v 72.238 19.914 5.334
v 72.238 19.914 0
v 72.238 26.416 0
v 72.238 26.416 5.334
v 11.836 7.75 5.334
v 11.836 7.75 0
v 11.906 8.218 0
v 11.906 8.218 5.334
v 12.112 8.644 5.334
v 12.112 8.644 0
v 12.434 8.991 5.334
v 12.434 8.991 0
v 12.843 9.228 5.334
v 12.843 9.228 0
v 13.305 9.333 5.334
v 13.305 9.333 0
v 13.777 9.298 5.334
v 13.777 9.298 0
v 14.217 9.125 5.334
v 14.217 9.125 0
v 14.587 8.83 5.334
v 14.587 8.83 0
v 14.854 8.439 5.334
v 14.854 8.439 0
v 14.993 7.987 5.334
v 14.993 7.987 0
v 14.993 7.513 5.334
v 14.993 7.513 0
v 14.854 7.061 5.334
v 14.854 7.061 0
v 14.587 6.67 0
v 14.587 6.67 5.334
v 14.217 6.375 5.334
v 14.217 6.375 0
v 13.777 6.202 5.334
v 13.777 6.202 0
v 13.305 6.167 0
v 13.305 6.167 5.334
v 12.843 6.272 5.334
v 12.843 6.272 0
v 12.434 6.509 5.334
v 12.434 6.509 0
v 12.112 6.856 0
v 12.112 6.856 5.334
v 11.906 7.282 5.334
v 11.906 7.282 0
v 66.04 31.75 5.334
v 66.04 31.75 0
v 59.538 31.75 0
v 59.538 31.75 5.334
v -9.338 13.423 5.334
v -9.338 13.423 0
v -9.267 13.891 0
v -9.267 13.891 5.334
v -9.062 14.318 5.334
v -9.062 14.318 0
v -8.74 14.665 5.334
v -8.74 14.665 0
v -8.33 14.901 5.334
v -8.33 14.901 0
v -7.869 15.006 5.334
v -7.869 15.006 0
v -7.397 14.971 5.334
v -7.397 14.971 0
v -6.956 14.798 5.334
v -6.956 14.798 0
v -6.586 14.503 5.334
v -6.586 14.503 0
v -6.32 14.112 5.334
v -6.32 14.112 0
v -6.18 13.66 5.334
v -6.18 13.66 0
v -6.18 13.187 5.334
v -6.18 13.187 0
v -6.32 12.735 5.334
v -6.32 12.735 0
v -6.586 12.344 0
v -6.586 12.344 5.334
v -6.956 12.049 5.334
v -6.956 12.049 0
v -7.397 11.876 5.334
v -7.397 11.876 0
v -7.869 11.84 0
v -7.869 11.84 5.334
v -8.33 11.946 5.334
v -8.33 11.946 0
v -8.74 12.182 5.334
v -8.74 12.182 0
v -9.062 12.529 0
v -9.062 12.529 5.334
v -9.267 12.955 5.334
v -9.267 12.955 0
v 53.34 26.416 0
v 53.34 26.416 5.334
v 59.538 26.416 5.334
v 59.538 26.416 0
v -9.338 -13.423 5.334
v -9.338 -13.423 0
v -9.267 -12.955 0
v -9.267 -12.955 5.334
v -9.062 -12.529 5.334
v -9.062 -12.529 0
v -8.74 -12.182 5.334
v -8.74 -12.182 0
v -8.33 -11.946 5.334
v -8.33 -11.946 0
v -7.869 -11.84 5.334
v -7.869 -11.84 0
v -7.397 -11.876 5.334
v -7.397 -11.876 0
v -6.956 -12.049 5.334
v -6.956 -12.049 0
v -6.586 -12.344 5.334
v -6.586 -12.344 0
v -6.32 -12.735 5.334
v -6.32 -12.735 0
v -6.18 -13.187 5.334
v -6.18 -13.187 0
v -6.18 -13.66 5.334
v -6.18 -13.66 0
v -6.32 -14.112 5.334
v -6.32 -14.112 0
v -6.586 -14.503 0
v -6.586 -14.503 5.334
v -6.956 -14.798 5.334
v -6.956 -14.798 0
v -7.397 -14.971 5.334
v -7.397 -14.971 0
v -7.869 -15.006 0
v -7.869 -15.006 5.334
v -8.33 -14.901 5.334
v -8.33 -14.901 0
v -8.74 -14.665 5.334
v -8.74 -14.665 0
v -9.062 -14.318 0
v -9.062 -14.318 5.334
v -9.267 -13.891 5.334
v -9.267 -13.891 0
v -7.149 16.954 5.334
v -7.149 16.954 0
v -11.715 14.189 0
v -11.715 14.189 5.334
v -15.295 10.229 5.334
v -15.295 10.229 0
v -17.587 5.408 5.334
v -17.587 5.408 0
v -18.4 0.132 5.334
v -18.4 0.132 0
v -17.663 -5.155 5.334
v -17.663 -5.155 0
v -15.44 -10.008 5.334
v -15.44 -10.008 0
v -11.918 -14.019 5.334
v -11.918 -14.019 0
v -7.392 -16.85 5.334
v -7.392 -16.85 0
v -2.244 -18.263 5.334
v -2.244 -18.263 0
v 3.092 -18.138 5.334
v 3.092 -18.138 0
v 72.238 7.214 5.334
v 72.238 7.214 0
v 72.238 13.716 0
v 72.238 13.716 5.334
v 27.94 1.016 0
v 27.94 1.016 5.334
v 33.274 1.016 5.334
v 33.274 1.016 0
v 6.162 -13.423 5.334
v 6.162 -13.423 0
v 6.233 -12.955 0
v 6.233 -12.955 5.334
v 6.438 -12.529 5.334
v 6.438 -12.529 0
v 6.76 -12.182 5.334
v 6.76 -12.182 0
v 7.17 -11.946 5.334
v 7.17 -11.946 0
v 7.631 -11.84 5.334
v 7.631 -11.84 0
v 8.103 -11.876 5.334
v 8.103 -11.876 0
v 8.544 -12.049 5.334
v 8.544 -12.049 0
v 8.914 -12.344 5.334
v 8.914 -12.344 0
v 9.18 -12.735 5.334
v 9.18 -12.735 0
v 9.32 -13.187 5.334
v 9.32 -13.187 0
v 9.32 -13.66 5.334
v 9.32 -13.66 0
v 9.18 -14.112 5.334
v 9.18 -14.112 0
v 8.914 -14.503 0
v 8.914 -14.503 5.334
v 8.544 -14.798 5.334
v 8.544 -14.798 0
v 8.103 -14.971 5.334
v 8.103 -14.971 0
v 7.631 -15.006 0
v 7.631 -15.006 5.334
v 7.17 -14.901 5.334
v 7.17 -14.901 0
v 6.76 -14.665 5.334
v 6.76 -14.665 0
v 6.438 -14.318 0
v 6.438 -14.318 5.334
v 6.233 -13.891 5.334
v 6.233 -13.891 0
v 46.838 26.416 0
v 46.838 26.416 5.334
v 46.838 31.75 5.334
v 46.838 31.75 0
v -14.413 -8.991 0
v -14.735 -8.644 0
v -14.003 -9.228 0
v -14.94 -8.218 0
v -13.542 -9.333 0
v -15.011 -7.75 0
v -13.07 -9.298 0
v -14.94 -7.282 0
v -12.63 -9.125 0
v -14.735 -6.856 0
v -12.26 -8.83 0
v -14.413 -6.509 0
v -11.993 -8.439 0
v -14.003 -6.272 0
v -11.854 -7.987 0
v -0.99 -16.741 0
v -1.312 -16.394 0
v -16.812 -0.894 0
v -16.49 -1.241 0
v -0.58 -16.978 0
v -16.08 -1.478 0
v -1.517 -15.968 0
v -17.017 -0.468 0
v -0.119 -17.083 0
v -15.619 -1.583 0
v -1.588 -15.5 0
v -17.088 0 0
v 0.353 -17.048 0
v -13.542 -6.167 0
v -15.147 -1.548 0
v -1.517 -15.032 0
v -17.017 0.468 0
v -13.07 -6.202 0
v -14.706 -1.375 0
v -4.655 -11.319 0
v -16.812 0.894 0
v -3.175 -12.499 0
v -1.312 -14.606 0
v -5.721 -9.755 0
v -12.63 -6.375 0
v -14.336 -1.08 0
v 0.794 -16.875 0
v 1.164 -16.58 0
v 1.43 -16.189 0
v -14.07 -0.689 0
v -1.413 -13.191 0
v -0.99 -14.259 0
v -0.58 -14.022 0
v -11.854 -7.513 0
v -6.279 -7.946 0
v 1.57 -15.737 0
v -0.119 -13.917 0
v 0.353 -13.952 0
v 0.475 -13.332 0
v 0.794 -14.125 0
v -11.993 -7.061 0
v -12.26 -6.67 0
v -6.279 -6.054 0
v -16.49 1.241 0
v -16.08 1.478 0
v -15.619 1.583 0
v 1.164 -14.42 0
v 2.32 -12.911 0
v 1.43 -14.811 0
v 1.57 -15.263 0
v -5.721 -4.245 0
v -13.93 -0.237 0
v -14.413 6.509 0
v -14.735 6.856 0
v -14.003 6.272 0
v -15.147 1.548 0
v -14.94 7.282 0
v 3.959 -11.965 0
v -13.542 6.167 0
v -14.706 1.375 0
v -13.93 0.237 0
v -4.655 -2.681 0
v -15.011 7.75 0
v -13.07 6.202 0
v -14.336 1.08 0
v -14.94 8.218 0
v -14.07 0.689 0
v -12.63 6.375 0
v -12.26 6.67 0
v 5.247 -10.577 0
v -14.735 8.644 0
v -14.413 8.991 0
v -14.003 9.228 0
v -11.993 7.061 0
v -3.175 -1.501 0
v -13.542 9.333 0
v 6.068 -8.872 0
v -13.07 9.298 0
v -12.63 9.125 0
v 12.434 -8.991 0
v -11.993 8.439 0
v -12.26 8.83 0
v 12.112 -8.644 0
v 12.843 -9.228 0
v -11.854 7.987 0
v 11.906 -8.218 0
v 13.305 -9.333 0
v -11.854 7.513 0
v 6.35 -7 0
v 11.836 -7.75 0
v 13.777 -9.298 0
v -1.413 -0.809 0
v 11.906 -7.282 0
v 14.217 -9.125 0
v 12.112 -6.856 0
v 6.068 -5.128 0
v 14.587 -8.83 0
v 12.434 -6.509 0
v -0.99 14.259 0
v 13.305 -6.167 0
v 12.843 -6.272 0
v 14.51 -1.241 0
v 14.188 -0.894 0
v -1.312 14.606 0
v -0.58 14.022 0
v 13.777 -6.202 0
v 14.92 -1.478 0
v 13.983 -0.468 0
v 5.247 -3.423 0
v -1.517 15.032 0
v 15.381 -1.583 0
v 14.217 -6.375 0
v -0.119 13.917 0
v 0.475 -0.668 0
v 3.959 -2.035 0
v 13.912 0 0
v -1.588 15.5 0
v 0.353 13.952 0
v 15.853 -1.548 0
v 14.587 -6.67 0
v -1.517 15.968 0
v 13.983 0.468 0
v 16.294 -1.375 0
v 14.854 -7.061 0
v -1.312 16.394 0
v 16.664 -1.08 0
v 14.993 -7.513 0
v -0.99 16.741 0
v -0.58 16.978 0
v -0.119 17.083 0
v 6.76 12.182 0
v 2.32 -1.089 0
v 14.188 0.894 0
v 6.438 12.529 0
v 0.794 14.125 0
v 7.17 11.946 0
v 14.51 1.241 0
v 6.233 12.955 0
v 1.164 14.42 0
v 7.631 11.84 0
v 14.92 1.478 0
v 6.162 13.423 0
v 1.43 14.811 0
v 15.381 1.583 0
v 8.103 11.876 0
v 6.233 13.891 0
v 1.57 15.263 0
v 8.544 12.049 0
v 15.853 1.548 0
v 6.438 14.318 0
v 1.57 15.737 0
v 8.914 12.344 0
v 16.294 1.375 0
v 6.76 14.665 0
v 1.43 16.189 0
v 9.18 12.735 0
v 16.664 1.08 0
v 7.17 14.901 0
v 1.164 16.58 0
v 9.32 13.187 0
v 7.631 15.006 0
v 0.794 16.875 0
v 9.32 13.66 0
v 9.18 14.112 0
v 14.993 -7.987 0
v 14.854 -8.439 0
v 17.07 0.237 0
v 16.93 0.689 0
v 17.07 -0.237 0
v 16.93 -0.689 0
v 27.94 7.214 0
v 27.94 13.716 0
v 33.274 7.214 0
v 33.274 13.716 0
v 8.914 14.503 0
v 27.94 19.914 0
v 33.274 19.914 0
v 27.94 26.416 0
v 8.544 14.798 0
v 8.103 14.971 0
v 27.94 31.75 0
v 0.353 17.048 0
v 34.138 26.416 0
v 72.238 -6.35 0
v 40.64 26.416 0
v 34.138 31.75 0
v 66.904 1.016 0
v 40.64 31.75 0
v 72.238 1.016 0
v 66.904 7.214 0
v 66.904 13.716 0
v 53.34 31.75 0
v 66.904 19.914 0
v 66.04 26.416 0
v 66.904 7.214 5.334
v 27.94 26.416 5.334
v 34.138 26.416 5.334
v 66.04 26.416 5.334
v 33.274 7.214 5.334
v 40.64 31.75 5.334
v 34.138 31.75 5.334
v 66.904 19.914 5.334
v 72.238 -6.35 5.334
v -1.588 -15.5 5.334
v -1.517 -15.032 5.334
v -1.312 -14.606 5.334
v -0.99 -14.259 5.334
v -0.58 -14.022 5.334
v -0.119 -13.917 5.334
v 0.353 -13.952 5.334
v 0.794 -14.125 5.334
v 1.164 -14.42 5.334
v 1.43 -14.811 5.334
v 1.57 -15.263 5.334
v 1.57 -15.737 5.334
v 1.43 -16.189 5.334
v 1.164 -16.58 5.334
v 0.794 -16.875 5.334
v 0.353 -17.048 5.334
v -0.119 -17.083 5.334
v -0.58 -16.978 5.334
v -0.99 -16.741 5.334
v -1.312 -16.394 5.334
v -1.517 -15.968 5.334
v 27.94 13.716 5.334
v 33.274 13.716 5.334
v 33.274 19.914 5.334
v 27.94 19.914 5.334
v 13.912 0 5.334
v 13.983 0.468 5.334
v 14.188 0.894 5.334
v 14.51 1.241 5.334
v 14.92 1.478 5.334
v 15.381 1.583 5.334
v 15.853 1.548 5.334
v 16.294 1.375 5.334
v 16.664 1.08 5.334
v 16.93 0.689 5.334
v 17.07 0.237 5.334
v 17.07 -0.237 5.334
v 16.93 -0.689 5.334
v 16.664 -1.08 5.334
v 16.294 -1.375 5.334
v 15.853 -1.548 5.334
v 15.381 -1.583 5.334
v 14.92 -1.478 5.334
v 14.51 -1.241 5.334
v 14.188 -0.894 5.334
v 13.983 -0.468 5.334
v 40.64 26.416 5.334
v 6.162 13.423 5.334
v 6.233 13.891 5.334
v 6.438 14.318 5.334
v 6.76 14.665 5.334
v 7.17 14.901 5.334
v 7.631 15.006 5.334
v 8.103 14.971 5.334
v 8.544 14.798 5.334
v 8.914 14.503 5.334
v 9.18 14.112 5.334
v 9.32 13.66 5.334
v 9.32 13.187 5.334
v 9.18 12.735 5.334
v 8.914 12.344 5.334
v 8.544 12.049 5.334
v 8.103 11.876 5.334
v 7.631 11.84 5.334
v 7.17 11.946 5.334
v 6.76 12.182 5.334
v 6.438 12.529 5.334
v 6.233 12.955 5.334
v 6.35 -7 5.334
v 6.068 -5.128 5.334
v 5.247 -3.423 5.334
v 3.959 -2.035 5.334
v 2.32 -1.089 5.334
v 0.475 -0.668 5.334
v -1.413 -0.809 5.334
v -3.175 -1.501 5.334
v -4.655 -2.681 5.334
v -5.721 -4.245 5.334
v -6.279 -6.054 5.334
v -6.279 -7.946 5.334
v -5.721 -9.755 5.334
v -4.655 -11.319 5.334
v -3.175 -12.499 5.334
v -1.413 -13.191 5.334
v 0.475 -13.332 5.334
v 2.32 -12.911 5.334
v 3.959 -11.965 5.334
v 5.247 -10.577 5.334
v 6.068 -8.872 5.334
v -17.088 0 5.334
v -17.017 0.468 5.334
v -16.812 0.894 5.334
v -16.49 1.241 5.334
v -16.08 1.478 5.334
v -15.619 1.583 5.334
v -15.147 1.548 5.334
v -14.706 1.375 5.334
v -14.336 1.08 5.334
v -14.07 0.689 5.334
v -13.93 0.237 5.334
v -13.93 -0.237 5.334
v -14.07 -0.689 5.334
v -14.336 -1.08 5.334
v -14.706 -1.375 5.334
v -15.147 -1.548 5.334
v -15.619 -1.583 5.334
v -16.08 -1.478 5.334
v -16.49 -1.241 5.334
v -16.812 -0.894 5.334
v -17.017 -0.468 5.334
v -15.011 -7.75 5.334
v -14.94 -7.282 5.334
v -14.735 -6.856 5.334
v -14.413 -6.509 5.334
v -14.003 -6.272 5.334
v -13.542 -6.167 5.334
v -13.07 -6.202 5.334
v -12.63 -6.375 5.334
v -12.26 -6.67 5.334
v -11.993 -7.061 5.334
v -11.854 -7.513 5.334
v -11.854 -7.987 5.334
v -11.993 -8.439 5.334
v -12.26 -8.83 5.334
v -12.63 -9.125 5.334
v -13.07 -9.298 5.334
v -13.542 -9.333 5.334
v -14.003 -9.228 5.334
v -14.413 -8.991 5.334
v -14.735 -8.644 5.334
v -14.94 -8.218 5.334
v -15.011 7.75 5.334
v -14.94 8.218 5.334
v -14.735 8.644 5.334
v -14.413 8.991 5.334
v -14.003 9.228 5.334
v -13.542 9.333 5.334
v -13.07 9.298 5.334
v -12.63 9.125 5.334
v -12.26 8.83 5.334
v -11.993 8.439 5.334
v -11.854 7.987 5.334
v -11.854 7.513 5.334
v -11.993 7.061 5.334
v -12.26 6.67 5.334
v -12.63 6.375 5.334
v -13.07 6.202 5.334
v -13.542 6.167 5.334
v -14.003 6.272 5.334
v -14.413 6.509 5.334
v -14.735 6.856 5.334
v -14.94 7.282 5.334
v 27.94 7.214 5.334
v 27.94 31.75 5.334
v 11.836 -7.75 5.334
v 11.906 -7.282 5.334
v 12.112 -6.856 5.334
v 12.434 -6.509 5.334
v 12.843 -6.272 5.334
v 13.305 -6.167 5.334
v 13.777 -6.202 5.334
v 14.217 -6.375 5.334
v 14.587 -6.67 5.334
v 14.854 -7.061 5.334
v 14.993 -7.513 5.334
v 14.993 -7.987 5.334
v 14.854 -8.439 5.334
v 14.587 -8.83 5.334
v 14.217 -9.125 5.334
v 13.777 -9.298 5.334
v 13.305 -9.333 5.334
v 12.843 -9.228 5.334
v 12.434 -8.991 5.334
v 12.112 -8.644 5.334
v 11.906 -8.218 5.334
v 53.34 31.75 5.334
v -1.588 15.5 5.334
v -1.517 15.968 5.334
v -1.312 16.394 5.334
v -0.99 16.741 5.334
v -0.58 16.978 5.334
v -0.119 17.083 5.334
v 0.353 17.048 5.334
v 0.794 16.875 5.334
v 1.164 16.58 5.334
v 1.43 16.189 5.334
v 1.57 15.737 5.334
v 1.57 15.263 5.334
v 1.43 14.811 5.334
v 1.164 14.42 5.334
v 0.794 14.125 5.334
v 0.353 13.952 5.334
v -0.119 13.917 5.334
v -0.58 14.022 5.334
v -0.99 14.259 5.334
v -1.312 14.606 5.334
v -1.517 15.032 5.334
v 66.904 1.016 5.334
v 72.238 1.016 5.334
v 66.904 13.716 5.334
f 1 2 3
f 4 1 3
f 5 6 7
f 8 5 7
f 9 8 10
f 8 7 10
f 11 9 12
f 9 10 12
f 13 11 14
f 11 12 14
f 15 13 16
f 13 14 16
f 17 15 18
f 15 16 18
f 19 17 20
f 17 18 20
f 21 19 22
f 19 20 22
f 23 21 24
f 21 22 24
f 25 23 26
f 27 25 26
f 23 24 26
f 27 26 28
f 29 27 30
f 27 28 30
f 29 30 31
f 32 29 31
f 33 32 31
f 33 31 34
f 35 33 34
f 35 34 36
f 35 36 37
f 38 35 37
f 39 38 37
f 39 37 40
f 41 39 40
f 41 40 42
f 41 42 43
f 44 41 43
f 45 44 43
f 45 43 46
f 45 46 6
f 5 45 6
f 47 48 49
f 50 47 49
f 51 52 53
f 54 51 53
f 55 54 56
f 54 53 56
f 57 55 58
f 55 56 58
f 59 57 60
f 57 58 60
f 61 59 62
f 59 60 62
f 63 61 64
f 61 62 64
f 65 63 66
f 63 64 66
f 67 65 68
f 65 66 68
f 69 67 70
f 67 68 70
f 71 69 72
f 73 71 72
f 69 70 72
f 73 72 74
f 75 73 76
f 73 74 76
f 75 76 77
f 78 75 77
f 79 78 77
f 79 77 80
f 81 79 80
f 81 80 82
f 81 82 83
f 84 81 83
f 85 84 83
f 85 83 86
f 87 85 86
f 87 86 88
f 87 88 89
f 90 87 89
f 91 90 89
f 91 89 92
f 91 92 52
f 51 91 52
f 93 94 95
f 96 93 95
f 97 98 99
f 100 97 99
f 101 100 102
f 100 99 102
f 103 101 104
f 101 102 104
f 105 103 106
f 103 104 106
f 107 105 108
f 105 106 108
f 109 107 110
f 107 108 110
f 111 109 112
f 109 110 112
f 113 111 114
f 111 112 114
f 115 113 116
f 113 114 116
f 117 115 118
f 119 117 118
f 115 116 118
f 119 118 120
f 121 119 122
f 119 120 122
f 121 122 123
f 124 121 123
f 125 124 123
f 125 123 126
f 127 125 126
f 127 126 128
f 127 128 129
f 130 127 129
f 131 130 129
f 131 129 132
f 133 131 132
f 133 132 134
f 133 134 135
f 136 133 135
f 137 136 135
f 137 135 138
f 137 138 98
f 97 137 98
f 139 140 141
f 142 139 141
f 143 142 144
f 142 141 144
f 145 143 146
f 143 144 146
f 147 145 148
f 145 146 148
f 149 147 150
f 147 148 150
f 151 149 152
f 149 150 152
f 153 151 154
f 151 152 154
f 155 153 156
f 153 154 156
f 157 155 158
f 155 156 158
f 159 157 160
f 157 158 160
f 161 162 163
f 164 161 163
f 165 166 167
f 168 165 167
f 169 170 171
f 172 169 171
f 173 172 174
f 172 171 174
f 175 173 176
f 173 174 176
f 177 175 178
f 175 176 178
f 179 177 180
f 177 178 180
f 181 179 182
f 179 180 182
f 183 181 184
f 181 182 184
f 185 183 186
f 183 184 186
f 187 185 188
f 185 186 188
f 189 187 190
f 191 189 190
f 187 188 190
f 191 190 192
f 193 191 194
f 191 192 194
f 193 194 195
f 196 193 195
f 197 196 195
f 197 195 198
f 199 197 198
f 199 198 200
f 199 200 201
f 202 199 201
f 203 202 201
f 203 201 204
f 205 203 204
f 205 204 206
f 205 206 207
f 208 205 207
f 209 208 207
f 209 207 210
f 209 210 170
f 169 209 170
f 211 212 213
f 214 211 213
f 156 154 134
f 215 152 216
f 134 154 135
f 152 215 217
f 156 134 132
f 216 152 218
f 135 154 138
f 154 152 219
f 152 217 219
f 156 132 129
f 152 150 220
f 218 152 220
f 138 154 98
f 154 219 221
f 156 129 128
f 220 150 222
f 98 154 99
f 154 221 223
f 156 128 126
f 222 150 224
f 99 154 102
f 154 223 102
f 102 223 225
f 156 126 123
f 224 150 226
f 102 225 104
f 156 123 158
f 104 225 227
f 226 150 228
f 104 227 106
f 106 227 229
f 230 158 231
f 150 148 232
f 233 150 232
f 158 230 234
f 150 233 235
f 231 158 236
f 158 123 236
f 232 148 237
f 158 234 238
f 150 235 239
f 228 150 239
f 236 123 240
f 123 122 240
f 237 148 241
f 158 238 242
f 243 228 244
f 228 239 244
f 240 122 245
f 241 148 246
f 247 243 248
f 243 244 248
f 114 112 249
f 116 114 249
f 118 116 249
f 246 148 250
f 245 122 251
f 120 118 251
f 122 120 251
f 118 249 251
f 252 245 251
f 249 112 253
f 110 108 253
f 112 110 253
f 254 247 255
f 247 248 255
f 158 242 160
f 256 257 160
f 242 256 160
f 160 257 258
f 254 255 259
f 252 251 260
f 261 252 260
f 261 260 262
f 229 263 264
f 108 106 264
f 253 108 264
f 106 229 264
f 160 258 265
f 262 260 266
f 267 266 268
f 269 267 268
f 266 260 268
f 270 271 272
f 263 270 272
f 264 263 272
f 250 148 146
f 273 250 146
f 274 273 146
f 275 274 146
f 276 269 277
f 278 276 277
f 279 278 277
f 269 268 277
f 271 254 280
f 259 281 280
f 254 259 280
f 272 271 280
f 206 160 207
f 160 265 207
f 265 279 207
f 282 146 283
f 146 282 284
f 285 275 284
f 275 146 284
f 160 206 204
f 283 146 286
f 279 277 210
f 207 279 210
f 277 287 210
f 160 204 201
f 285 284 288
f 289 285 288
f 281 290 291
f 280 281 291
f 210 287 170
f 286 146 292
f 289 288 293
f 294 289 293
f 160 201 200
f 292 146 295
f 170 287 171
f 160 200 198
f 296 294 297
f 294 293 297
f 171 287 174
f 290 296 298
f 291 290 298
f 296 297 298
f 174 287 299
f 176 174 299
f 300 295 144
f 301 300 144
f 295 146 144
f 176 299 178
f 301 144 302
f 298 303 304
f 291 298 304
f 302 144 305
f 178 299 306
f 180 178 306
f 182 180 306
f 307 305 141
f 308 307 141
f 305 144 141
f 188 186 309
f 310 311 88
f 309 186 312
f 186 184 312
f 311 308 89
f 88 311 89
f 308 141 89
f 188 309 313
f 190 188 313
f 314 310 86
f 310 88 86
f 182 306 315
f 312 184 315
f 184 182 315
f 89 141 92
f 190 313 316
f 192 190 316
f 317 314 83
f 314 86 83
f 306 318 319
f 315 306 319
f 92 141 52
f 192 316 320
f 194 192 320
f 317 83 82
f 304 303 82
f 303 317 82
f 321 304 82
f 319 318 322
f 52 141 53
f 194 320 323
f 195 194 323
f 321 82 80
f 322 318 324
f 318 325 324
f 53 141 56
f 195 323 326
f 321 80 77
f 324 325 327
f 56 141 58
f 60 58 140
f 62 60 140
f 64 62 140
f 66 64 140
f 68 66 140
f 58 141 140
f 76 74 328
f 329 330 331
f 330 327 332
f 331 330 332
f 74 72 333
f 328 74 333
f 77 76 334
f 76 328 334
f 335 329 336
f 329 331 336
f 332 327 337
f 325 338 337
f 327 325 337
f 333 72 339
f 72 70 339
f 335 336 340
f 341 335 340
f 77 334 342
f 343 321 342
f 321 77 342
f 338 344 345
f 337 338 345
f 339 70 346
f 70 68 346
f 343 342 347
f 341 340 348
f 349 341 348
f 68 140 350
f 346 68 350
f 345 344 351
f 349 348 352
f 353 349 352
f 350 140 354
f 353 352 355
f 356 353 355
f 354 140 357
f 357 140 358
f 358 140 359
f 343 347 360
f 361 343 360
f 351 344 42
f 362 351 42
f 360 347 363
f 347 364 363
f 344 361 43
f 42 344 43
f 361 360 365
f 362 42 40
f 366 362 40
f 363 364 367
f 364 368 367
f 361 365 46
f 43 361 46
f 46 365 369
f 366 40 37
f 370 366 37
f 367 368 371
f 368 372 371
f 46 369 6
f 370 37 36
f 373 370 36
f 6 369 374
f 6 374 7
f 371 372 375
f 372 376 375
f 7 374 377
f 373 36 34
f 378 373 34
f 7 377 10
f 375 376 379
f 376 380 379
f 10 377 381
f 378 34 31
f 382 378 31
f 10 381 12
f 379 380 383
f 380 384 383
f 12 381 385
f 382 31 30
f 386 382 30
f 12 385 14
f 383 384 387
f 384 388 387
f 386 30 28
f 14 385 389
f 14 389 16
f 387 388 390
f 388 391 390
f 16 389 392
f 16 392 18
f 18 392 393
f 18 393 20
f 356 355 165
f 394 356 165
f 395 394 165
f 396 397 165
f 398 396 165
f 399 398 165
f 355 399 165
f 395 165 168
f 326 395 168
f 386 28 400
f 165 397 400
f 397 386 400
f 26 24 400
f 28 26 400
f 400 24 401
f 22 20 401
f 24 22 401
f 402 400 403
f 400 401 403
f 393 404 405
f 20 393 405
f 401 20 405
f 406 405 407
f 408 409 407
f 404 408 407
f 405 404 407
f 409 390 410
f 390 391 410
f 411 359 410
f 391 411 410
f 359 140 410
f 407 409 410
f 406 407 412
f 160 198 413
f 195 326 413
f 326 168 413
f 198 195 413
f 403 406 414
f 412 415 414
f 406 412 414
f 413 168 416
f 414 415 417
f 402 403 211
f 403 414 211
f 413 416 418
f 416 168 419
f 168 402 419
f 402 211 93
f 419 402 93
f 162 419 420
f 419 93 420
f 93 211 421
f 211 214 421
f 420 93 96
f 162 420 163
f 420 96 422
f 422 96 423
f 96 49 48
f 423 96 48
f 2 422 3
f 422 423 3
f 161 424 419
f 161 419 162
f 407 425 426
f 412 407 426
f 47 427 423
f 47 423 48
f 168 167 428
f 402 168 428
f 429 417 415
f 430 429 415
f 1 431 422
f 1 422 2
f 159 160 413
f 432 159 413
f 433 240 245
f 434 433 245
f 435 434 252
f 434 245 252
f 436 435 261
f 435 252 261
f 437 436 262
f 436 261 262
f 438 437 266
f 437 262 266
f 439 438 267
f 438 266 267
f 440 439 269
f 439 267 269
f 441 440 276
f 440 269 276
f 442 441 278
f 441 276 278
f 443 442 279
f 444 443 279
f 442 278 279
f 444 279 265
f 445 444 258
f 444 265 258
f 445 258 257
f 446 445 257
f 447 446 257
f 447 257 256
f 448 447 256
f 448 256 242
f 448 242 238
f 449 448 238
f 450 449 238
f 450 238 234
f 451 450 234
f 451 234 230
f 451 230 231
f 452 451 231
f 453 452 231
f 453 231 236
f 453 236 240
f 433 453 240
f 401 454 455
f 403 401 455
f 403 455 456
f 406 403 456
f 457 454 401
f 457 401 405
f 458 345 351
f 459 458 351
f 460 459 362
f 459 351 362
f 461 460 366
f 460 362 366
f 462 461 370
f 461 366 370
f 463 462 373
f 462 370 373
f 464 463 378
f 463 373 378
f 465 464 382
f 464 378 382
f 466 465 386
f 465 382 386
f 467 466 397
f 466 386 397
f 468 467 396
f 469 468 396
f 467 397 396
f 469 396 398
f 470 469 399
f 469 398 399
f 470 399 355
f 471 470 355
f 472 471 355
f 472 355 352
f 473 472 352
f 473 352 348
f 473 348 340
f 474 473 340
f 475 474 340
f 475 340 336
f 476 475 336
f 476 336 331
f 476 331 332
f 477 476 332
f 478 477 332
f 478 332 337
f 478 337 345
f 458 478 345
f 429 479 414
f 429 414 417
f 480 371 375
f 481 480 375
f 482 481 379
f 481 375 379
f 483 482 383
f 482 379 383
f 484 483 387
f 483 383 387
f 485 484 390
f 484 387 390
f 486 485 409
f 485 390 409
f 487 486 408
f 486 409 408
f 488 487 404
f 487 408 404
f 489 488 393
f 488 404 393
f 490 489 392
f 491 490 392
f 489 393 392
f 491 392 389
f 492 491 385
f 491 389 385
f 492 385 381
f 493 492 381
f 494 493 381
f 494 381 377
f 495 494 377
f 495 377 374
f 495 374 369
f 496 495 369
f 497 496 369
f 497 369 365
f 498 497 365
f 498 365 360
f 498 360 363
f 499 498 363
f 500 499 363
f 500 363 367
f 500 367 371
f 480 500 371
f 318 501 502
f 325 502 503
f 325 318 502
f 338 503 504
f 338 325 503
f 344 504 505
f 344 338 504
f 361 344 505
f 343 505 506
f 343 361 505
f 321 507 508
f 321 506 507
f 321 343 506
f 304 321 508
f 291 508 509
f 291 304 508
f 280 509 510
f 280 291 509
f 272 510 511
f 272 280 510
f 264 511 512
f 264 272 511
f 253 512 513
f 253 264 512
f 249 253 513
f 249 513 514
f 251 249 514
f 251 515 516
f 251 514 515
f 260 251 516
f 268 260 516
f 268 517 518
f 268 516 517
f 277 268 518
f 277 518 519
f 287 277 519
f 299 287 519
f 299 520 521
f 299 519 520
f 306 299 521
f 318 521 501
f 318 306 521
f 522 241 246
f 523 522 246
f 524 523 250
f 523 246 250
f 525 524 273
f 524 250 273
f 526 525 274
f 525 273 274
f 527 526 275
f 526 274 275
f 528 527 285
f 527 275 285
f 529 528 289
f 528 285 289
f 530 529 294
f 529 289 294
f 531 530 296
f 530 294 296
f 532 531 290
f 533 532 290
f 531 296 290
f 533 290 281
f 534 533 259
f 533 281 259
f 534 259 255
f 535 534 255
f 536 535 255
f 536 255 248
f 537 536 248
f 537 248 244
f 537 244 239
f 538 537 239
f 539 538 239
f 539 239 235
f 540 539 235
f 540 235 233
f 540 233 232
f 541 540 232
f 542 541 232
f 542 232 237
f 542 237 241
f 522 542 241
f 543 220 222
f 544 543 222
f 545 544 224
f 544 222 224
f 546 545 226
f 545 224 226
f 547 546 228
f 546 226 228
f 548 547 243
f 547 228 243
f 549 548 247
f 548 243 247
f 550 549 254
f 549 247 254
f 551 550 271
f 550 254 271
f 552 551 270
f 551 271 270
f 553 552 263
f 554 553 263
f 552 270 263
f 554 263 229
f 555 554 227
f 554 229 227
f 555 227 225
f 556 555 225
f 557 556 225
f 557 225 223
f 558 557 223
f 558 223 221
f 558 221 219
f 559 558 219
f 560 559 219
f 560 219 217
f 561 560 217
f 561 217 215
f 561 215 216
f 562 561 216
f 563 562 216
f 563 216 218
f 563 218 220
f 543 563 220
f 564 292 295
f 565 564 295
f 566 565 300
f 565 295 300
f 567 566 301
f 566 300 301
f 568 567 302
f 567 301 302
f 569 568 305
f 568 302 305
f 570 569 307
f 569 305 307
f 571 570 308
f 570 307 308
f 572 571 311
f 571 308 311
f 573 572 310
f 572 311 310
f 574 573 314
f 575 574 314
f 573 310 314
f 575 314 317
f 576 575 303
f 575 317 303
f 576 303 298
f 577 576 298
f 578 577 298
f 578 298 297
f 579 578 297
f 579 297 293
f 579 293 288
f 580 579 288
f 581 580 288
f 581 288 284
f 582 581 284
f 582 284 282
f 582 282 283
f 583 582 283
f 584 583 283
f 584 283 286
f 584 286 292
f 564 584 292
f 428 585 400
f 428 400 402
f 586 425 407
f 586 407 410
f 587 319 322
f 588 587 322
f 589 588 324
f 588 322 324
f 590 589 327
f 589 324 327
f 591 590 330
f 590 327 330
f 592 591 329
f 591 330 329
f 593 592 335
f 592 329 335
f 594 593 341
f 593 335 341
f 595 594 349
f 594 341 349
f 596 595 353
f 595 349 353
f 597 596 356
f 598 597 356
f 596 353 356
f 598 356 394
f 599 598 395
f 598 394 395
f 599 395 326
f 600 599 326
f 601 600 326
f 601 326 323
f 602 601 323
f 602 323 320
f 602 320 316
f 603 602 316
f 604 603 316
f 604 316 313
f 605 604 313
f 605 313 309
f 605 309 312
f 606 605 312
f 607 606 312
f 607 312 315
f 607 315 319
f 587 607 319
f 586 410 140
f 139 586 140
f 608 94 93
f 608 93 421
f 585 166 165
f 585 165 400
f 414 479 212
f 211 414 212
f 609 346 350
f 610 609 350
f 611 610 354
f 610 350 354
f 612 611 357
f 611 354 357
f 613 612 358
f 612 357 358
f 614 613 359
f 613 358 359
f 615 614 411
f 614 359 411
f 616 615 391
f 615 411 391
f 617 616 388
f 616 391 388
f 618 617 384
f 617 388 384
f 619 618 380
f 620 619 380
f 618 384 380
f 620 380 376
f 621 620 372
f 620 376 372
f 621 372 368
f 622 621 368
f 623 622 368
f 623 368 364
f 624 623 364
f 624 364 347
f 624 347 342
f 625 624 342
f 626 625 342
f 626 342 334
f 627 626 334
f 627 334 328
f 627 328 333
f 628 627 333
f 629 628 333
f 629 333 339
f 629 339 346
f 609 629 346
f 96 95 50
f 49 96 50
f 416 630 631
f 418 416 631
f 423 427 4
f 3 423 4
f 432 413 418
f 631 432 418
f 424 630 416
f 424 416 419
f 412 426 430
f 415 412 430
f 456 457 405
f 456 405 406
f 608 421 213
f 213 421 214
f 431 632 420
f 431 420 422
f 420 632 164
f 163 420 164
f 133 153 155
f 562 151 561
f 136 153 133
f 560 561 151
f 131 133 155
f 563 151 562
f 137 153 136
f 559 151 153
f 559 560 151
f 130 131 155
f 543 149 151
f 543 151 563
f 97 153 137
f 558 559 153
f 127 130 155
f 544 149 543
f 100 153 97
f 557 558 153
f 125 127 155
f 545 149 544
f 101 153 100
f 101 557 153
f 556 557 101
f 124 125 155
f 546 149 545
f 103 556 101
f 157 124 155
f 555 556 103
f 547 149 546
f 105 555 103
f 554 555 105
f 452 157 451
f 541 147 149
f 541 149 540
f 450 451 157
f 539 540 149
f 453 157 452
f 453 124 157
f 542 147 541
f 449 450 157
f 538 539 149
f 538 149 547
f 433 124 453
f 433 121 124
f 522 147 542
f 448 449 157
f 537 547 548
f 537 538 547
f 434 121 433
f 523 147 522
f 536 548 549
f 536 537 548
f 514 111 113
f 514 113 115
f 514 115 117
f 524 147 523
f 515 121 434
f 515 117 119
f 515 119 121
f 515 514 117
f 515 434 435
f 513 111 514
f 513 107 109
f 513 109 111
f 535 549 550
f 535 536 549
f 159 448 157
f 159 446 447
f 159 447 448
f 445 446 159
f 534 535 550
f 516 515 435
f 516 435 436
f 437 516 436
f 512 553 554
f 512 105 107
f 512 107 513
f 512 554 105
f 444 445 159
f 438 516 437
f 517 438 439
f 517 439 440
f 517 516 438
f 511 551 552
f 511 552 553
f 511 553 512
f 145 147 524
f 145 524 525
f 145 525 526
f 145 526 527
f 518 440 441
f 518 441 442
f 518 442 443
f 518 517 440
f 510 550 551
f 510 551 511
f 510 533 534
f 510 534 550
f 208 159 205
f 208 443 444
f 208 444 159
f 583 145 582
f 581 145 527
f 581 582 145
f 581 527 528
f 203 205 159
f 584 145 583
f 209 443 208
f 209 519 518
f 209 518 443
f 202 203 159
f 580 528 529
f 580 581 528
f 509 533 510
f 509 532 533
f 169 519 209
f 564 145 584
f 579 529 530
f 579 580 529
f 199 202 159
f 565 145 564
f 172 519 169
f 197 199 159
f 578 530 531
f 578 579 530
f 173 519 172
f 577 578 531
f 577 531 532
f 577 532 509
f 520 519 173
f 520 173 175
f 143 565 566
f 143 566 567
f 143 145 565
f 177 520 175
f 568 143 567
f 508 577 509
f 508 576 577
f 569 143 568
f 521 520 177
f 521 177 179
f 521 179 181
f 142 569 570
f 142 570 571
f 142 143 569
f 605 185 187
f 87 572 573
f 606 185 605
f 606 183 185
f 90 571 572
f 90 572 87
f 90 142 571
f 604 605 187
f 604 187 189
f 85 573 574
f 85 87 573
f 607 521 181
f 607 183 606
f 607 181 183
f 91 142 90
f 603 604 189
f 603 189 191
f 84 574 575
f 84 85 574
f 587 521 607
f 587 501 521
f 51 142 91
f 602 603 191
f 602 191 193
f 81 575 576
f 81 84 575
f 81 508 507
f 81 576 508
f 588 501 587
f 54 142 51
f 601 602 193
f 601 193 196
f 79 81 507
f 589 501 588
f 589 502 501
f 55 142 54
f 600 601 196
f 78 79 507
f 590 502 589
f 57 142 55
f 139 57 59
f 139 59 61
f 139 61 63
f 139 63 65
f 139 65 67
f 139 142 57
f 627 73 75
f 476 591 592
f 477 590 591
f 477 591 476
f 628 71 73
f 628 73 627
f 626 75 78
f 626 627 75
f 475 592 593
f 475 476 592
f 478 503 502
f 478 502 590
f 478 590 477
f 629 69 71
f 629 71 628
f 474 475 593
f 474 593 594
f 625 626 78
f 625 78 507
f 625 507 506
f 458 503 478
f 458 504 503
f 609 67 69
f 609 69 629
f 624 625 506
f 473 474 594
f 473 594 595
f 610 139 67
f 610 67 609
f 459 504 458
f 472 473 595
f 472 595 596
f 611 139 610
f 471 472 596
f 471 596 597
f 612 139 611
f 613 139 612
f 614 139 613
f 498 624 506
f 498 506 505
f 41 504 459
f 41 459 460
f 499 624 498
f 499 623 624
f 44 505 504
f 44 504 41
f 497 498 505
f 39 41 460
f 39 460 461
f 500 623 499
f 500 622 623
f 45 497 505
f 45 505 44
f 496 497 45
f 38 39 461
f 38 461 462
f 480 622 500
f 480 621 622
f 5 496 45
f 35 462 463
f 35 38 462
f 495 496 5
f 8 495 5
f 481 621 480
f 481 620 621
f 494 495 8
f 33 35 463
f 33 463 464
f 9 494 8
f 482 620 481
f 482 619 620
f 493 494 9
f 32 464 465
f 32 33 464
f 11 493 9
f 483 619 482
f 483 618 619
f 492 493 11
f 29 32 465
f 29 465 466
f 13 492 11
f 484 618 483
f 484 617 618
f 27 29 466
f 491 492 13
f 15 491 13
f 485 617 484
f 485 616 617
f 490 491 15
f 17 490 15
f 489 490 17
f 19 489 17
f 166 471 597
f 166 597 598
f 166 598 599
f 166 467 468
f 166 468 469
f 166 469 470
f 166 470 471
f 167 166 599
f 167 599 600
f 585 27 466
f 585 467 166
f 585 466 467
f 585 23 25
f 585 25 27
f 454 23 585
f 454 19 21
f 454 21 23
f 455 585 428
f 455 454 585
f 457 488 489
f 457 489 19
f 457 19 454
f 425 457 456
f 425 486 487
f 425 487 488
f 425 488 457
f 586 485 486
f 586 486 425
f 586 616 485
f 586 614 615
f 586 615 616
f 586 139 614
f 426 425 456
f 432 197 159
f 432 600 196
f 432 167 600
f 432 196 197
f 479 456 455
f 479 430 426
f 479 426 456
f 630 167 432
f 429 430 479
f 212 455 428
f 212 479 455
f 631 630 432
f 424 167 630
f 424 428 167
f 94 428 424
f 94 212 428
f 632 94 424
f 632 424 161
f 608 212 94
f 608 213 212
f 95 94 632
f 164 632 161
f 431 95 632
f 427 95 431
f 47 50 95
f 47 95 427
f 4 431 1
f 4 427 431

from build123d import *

# Parameters (mm, degrees)
BOSS_EXTRUDE1_DEPTH          = 5.334
SKETCH1_3_R                  = 6.35
CUT_EXTRUDE2_DEPTH           = 80.087198141
F_1_8_0_125_DIAMETER_HOLE1_D = 3.175
SKETCH4_W                    = 6.1976
SKETCH4_H                    = 5.334
CUT_EXTRUDE3_DEPTH           = 80.087198141
LPATTERN1_COUNT              = 4
LPATTERN1_PITCH              = 12.7
SKETCH5_W                    = 5.334
SKETCH5_H                    = 6.1976
CUT_EXTRUDE4_DEPTH           = 80.087198141
LPATTERN2_COUNT              = 2
LPATTERN2_PITCH              = 12.7


with BuildPart() as part:
    # Sketch1 → Boss-Extrude1 (new body)
    with BuildSketch(Plane.XY):
        with BuildLine():
            Line((72.2376, 31.75), (27.94, 31.75))
            Line((27.94, 31.75), (-7.148981901, 16.95441116))
            ThreePointArc((-7.148981901, 16.95441116), (-17.663197211, -5.154751622), (3.092321188, -18.138289602))
            Line((3.092321188, -18.138289602), (72.2376, -6.35))
            Line((72.2376, -6.35), (72.2376, 31.75))
        make_face()
    extrude(amount=BOSS_EXTRUDE1_DEPTH)

    # Sketch1<3> → Cut-Extrude2 (cut, through all)
    with BuildSketch(Plane.XY):
        with Locations((0, -7)):
            Circle(SKETCH1_3_R)
    extrude(amount=CUT_EXTRUDE2_DEPTH, mode=Mode.SUBTRACT)

    # 1/8 (0.125) Diameter Hole1 (through all)
    with Locations(Plane.XY.offset(5.334)):
        with Locations((0, 15.5), (7.75, 13.423393759), (13.423393759, 7.75), (15.5, 0), (13.423393759, -7.75), (7.75, -13.423393759), (0, -15.5), (-7.75, -13.423393759), (-13.423393759, -7.75), (-15.5, 0), (-13.423393759, 7.75), (-7.75, 13.423393759)):
            Hole(F_1_8_0_125_DIAMETER_HOLE1_D / 2)

    # Sketch4 → Cut-Extrude3 (cut, through all)
    with BuildSketch(Plane.XY.offset(5.334)):
        with Locations((31.0388, 29.083)):
            Rectangle(SKETCH4_W, SKETCH4_H)
    cut_extrude3 = extrude(amount=-CUT_EXTRUDE3_DEPTH, mode=Mode.SUBTRACT)

    # LPattern1: Cut-Extrude3 ×4
    with Locations(*[(i * LPATTERN1_PITCH, 0, 0) for i in range(1, LPATTERN1_COUNT)]):
        add(cut_extrude3, mode=Mode.SUBTRACT)

    # Sketch5 → Cut-Extrude4 (cut, through all)
    with BuildSketch(Plane.XY.offset(5.334)):
        with Locations((69.5706, 16.8148)):
            Rectangle(SKETCH5_W, SKETCH5_H)
        with Locations((30.607, 16.8148)):
            Rectangle(SKETCH5_W, SKETCH5_H)
    cut_extrude4 = extrude(amount=-CUT_EXTRUDE4_DEPTH, mode=Mode.SUBTRACT)

    # LPattern2: Cut-Extrude4 ×2
    with Locations(*[(0, -i * LPATTERN2_PITCH, 0) for i in range(1, LPATTERN2_COUNT)]):
        add(cut_extrude4, mode=Mode.SUBTRACT)


solid = part.part
